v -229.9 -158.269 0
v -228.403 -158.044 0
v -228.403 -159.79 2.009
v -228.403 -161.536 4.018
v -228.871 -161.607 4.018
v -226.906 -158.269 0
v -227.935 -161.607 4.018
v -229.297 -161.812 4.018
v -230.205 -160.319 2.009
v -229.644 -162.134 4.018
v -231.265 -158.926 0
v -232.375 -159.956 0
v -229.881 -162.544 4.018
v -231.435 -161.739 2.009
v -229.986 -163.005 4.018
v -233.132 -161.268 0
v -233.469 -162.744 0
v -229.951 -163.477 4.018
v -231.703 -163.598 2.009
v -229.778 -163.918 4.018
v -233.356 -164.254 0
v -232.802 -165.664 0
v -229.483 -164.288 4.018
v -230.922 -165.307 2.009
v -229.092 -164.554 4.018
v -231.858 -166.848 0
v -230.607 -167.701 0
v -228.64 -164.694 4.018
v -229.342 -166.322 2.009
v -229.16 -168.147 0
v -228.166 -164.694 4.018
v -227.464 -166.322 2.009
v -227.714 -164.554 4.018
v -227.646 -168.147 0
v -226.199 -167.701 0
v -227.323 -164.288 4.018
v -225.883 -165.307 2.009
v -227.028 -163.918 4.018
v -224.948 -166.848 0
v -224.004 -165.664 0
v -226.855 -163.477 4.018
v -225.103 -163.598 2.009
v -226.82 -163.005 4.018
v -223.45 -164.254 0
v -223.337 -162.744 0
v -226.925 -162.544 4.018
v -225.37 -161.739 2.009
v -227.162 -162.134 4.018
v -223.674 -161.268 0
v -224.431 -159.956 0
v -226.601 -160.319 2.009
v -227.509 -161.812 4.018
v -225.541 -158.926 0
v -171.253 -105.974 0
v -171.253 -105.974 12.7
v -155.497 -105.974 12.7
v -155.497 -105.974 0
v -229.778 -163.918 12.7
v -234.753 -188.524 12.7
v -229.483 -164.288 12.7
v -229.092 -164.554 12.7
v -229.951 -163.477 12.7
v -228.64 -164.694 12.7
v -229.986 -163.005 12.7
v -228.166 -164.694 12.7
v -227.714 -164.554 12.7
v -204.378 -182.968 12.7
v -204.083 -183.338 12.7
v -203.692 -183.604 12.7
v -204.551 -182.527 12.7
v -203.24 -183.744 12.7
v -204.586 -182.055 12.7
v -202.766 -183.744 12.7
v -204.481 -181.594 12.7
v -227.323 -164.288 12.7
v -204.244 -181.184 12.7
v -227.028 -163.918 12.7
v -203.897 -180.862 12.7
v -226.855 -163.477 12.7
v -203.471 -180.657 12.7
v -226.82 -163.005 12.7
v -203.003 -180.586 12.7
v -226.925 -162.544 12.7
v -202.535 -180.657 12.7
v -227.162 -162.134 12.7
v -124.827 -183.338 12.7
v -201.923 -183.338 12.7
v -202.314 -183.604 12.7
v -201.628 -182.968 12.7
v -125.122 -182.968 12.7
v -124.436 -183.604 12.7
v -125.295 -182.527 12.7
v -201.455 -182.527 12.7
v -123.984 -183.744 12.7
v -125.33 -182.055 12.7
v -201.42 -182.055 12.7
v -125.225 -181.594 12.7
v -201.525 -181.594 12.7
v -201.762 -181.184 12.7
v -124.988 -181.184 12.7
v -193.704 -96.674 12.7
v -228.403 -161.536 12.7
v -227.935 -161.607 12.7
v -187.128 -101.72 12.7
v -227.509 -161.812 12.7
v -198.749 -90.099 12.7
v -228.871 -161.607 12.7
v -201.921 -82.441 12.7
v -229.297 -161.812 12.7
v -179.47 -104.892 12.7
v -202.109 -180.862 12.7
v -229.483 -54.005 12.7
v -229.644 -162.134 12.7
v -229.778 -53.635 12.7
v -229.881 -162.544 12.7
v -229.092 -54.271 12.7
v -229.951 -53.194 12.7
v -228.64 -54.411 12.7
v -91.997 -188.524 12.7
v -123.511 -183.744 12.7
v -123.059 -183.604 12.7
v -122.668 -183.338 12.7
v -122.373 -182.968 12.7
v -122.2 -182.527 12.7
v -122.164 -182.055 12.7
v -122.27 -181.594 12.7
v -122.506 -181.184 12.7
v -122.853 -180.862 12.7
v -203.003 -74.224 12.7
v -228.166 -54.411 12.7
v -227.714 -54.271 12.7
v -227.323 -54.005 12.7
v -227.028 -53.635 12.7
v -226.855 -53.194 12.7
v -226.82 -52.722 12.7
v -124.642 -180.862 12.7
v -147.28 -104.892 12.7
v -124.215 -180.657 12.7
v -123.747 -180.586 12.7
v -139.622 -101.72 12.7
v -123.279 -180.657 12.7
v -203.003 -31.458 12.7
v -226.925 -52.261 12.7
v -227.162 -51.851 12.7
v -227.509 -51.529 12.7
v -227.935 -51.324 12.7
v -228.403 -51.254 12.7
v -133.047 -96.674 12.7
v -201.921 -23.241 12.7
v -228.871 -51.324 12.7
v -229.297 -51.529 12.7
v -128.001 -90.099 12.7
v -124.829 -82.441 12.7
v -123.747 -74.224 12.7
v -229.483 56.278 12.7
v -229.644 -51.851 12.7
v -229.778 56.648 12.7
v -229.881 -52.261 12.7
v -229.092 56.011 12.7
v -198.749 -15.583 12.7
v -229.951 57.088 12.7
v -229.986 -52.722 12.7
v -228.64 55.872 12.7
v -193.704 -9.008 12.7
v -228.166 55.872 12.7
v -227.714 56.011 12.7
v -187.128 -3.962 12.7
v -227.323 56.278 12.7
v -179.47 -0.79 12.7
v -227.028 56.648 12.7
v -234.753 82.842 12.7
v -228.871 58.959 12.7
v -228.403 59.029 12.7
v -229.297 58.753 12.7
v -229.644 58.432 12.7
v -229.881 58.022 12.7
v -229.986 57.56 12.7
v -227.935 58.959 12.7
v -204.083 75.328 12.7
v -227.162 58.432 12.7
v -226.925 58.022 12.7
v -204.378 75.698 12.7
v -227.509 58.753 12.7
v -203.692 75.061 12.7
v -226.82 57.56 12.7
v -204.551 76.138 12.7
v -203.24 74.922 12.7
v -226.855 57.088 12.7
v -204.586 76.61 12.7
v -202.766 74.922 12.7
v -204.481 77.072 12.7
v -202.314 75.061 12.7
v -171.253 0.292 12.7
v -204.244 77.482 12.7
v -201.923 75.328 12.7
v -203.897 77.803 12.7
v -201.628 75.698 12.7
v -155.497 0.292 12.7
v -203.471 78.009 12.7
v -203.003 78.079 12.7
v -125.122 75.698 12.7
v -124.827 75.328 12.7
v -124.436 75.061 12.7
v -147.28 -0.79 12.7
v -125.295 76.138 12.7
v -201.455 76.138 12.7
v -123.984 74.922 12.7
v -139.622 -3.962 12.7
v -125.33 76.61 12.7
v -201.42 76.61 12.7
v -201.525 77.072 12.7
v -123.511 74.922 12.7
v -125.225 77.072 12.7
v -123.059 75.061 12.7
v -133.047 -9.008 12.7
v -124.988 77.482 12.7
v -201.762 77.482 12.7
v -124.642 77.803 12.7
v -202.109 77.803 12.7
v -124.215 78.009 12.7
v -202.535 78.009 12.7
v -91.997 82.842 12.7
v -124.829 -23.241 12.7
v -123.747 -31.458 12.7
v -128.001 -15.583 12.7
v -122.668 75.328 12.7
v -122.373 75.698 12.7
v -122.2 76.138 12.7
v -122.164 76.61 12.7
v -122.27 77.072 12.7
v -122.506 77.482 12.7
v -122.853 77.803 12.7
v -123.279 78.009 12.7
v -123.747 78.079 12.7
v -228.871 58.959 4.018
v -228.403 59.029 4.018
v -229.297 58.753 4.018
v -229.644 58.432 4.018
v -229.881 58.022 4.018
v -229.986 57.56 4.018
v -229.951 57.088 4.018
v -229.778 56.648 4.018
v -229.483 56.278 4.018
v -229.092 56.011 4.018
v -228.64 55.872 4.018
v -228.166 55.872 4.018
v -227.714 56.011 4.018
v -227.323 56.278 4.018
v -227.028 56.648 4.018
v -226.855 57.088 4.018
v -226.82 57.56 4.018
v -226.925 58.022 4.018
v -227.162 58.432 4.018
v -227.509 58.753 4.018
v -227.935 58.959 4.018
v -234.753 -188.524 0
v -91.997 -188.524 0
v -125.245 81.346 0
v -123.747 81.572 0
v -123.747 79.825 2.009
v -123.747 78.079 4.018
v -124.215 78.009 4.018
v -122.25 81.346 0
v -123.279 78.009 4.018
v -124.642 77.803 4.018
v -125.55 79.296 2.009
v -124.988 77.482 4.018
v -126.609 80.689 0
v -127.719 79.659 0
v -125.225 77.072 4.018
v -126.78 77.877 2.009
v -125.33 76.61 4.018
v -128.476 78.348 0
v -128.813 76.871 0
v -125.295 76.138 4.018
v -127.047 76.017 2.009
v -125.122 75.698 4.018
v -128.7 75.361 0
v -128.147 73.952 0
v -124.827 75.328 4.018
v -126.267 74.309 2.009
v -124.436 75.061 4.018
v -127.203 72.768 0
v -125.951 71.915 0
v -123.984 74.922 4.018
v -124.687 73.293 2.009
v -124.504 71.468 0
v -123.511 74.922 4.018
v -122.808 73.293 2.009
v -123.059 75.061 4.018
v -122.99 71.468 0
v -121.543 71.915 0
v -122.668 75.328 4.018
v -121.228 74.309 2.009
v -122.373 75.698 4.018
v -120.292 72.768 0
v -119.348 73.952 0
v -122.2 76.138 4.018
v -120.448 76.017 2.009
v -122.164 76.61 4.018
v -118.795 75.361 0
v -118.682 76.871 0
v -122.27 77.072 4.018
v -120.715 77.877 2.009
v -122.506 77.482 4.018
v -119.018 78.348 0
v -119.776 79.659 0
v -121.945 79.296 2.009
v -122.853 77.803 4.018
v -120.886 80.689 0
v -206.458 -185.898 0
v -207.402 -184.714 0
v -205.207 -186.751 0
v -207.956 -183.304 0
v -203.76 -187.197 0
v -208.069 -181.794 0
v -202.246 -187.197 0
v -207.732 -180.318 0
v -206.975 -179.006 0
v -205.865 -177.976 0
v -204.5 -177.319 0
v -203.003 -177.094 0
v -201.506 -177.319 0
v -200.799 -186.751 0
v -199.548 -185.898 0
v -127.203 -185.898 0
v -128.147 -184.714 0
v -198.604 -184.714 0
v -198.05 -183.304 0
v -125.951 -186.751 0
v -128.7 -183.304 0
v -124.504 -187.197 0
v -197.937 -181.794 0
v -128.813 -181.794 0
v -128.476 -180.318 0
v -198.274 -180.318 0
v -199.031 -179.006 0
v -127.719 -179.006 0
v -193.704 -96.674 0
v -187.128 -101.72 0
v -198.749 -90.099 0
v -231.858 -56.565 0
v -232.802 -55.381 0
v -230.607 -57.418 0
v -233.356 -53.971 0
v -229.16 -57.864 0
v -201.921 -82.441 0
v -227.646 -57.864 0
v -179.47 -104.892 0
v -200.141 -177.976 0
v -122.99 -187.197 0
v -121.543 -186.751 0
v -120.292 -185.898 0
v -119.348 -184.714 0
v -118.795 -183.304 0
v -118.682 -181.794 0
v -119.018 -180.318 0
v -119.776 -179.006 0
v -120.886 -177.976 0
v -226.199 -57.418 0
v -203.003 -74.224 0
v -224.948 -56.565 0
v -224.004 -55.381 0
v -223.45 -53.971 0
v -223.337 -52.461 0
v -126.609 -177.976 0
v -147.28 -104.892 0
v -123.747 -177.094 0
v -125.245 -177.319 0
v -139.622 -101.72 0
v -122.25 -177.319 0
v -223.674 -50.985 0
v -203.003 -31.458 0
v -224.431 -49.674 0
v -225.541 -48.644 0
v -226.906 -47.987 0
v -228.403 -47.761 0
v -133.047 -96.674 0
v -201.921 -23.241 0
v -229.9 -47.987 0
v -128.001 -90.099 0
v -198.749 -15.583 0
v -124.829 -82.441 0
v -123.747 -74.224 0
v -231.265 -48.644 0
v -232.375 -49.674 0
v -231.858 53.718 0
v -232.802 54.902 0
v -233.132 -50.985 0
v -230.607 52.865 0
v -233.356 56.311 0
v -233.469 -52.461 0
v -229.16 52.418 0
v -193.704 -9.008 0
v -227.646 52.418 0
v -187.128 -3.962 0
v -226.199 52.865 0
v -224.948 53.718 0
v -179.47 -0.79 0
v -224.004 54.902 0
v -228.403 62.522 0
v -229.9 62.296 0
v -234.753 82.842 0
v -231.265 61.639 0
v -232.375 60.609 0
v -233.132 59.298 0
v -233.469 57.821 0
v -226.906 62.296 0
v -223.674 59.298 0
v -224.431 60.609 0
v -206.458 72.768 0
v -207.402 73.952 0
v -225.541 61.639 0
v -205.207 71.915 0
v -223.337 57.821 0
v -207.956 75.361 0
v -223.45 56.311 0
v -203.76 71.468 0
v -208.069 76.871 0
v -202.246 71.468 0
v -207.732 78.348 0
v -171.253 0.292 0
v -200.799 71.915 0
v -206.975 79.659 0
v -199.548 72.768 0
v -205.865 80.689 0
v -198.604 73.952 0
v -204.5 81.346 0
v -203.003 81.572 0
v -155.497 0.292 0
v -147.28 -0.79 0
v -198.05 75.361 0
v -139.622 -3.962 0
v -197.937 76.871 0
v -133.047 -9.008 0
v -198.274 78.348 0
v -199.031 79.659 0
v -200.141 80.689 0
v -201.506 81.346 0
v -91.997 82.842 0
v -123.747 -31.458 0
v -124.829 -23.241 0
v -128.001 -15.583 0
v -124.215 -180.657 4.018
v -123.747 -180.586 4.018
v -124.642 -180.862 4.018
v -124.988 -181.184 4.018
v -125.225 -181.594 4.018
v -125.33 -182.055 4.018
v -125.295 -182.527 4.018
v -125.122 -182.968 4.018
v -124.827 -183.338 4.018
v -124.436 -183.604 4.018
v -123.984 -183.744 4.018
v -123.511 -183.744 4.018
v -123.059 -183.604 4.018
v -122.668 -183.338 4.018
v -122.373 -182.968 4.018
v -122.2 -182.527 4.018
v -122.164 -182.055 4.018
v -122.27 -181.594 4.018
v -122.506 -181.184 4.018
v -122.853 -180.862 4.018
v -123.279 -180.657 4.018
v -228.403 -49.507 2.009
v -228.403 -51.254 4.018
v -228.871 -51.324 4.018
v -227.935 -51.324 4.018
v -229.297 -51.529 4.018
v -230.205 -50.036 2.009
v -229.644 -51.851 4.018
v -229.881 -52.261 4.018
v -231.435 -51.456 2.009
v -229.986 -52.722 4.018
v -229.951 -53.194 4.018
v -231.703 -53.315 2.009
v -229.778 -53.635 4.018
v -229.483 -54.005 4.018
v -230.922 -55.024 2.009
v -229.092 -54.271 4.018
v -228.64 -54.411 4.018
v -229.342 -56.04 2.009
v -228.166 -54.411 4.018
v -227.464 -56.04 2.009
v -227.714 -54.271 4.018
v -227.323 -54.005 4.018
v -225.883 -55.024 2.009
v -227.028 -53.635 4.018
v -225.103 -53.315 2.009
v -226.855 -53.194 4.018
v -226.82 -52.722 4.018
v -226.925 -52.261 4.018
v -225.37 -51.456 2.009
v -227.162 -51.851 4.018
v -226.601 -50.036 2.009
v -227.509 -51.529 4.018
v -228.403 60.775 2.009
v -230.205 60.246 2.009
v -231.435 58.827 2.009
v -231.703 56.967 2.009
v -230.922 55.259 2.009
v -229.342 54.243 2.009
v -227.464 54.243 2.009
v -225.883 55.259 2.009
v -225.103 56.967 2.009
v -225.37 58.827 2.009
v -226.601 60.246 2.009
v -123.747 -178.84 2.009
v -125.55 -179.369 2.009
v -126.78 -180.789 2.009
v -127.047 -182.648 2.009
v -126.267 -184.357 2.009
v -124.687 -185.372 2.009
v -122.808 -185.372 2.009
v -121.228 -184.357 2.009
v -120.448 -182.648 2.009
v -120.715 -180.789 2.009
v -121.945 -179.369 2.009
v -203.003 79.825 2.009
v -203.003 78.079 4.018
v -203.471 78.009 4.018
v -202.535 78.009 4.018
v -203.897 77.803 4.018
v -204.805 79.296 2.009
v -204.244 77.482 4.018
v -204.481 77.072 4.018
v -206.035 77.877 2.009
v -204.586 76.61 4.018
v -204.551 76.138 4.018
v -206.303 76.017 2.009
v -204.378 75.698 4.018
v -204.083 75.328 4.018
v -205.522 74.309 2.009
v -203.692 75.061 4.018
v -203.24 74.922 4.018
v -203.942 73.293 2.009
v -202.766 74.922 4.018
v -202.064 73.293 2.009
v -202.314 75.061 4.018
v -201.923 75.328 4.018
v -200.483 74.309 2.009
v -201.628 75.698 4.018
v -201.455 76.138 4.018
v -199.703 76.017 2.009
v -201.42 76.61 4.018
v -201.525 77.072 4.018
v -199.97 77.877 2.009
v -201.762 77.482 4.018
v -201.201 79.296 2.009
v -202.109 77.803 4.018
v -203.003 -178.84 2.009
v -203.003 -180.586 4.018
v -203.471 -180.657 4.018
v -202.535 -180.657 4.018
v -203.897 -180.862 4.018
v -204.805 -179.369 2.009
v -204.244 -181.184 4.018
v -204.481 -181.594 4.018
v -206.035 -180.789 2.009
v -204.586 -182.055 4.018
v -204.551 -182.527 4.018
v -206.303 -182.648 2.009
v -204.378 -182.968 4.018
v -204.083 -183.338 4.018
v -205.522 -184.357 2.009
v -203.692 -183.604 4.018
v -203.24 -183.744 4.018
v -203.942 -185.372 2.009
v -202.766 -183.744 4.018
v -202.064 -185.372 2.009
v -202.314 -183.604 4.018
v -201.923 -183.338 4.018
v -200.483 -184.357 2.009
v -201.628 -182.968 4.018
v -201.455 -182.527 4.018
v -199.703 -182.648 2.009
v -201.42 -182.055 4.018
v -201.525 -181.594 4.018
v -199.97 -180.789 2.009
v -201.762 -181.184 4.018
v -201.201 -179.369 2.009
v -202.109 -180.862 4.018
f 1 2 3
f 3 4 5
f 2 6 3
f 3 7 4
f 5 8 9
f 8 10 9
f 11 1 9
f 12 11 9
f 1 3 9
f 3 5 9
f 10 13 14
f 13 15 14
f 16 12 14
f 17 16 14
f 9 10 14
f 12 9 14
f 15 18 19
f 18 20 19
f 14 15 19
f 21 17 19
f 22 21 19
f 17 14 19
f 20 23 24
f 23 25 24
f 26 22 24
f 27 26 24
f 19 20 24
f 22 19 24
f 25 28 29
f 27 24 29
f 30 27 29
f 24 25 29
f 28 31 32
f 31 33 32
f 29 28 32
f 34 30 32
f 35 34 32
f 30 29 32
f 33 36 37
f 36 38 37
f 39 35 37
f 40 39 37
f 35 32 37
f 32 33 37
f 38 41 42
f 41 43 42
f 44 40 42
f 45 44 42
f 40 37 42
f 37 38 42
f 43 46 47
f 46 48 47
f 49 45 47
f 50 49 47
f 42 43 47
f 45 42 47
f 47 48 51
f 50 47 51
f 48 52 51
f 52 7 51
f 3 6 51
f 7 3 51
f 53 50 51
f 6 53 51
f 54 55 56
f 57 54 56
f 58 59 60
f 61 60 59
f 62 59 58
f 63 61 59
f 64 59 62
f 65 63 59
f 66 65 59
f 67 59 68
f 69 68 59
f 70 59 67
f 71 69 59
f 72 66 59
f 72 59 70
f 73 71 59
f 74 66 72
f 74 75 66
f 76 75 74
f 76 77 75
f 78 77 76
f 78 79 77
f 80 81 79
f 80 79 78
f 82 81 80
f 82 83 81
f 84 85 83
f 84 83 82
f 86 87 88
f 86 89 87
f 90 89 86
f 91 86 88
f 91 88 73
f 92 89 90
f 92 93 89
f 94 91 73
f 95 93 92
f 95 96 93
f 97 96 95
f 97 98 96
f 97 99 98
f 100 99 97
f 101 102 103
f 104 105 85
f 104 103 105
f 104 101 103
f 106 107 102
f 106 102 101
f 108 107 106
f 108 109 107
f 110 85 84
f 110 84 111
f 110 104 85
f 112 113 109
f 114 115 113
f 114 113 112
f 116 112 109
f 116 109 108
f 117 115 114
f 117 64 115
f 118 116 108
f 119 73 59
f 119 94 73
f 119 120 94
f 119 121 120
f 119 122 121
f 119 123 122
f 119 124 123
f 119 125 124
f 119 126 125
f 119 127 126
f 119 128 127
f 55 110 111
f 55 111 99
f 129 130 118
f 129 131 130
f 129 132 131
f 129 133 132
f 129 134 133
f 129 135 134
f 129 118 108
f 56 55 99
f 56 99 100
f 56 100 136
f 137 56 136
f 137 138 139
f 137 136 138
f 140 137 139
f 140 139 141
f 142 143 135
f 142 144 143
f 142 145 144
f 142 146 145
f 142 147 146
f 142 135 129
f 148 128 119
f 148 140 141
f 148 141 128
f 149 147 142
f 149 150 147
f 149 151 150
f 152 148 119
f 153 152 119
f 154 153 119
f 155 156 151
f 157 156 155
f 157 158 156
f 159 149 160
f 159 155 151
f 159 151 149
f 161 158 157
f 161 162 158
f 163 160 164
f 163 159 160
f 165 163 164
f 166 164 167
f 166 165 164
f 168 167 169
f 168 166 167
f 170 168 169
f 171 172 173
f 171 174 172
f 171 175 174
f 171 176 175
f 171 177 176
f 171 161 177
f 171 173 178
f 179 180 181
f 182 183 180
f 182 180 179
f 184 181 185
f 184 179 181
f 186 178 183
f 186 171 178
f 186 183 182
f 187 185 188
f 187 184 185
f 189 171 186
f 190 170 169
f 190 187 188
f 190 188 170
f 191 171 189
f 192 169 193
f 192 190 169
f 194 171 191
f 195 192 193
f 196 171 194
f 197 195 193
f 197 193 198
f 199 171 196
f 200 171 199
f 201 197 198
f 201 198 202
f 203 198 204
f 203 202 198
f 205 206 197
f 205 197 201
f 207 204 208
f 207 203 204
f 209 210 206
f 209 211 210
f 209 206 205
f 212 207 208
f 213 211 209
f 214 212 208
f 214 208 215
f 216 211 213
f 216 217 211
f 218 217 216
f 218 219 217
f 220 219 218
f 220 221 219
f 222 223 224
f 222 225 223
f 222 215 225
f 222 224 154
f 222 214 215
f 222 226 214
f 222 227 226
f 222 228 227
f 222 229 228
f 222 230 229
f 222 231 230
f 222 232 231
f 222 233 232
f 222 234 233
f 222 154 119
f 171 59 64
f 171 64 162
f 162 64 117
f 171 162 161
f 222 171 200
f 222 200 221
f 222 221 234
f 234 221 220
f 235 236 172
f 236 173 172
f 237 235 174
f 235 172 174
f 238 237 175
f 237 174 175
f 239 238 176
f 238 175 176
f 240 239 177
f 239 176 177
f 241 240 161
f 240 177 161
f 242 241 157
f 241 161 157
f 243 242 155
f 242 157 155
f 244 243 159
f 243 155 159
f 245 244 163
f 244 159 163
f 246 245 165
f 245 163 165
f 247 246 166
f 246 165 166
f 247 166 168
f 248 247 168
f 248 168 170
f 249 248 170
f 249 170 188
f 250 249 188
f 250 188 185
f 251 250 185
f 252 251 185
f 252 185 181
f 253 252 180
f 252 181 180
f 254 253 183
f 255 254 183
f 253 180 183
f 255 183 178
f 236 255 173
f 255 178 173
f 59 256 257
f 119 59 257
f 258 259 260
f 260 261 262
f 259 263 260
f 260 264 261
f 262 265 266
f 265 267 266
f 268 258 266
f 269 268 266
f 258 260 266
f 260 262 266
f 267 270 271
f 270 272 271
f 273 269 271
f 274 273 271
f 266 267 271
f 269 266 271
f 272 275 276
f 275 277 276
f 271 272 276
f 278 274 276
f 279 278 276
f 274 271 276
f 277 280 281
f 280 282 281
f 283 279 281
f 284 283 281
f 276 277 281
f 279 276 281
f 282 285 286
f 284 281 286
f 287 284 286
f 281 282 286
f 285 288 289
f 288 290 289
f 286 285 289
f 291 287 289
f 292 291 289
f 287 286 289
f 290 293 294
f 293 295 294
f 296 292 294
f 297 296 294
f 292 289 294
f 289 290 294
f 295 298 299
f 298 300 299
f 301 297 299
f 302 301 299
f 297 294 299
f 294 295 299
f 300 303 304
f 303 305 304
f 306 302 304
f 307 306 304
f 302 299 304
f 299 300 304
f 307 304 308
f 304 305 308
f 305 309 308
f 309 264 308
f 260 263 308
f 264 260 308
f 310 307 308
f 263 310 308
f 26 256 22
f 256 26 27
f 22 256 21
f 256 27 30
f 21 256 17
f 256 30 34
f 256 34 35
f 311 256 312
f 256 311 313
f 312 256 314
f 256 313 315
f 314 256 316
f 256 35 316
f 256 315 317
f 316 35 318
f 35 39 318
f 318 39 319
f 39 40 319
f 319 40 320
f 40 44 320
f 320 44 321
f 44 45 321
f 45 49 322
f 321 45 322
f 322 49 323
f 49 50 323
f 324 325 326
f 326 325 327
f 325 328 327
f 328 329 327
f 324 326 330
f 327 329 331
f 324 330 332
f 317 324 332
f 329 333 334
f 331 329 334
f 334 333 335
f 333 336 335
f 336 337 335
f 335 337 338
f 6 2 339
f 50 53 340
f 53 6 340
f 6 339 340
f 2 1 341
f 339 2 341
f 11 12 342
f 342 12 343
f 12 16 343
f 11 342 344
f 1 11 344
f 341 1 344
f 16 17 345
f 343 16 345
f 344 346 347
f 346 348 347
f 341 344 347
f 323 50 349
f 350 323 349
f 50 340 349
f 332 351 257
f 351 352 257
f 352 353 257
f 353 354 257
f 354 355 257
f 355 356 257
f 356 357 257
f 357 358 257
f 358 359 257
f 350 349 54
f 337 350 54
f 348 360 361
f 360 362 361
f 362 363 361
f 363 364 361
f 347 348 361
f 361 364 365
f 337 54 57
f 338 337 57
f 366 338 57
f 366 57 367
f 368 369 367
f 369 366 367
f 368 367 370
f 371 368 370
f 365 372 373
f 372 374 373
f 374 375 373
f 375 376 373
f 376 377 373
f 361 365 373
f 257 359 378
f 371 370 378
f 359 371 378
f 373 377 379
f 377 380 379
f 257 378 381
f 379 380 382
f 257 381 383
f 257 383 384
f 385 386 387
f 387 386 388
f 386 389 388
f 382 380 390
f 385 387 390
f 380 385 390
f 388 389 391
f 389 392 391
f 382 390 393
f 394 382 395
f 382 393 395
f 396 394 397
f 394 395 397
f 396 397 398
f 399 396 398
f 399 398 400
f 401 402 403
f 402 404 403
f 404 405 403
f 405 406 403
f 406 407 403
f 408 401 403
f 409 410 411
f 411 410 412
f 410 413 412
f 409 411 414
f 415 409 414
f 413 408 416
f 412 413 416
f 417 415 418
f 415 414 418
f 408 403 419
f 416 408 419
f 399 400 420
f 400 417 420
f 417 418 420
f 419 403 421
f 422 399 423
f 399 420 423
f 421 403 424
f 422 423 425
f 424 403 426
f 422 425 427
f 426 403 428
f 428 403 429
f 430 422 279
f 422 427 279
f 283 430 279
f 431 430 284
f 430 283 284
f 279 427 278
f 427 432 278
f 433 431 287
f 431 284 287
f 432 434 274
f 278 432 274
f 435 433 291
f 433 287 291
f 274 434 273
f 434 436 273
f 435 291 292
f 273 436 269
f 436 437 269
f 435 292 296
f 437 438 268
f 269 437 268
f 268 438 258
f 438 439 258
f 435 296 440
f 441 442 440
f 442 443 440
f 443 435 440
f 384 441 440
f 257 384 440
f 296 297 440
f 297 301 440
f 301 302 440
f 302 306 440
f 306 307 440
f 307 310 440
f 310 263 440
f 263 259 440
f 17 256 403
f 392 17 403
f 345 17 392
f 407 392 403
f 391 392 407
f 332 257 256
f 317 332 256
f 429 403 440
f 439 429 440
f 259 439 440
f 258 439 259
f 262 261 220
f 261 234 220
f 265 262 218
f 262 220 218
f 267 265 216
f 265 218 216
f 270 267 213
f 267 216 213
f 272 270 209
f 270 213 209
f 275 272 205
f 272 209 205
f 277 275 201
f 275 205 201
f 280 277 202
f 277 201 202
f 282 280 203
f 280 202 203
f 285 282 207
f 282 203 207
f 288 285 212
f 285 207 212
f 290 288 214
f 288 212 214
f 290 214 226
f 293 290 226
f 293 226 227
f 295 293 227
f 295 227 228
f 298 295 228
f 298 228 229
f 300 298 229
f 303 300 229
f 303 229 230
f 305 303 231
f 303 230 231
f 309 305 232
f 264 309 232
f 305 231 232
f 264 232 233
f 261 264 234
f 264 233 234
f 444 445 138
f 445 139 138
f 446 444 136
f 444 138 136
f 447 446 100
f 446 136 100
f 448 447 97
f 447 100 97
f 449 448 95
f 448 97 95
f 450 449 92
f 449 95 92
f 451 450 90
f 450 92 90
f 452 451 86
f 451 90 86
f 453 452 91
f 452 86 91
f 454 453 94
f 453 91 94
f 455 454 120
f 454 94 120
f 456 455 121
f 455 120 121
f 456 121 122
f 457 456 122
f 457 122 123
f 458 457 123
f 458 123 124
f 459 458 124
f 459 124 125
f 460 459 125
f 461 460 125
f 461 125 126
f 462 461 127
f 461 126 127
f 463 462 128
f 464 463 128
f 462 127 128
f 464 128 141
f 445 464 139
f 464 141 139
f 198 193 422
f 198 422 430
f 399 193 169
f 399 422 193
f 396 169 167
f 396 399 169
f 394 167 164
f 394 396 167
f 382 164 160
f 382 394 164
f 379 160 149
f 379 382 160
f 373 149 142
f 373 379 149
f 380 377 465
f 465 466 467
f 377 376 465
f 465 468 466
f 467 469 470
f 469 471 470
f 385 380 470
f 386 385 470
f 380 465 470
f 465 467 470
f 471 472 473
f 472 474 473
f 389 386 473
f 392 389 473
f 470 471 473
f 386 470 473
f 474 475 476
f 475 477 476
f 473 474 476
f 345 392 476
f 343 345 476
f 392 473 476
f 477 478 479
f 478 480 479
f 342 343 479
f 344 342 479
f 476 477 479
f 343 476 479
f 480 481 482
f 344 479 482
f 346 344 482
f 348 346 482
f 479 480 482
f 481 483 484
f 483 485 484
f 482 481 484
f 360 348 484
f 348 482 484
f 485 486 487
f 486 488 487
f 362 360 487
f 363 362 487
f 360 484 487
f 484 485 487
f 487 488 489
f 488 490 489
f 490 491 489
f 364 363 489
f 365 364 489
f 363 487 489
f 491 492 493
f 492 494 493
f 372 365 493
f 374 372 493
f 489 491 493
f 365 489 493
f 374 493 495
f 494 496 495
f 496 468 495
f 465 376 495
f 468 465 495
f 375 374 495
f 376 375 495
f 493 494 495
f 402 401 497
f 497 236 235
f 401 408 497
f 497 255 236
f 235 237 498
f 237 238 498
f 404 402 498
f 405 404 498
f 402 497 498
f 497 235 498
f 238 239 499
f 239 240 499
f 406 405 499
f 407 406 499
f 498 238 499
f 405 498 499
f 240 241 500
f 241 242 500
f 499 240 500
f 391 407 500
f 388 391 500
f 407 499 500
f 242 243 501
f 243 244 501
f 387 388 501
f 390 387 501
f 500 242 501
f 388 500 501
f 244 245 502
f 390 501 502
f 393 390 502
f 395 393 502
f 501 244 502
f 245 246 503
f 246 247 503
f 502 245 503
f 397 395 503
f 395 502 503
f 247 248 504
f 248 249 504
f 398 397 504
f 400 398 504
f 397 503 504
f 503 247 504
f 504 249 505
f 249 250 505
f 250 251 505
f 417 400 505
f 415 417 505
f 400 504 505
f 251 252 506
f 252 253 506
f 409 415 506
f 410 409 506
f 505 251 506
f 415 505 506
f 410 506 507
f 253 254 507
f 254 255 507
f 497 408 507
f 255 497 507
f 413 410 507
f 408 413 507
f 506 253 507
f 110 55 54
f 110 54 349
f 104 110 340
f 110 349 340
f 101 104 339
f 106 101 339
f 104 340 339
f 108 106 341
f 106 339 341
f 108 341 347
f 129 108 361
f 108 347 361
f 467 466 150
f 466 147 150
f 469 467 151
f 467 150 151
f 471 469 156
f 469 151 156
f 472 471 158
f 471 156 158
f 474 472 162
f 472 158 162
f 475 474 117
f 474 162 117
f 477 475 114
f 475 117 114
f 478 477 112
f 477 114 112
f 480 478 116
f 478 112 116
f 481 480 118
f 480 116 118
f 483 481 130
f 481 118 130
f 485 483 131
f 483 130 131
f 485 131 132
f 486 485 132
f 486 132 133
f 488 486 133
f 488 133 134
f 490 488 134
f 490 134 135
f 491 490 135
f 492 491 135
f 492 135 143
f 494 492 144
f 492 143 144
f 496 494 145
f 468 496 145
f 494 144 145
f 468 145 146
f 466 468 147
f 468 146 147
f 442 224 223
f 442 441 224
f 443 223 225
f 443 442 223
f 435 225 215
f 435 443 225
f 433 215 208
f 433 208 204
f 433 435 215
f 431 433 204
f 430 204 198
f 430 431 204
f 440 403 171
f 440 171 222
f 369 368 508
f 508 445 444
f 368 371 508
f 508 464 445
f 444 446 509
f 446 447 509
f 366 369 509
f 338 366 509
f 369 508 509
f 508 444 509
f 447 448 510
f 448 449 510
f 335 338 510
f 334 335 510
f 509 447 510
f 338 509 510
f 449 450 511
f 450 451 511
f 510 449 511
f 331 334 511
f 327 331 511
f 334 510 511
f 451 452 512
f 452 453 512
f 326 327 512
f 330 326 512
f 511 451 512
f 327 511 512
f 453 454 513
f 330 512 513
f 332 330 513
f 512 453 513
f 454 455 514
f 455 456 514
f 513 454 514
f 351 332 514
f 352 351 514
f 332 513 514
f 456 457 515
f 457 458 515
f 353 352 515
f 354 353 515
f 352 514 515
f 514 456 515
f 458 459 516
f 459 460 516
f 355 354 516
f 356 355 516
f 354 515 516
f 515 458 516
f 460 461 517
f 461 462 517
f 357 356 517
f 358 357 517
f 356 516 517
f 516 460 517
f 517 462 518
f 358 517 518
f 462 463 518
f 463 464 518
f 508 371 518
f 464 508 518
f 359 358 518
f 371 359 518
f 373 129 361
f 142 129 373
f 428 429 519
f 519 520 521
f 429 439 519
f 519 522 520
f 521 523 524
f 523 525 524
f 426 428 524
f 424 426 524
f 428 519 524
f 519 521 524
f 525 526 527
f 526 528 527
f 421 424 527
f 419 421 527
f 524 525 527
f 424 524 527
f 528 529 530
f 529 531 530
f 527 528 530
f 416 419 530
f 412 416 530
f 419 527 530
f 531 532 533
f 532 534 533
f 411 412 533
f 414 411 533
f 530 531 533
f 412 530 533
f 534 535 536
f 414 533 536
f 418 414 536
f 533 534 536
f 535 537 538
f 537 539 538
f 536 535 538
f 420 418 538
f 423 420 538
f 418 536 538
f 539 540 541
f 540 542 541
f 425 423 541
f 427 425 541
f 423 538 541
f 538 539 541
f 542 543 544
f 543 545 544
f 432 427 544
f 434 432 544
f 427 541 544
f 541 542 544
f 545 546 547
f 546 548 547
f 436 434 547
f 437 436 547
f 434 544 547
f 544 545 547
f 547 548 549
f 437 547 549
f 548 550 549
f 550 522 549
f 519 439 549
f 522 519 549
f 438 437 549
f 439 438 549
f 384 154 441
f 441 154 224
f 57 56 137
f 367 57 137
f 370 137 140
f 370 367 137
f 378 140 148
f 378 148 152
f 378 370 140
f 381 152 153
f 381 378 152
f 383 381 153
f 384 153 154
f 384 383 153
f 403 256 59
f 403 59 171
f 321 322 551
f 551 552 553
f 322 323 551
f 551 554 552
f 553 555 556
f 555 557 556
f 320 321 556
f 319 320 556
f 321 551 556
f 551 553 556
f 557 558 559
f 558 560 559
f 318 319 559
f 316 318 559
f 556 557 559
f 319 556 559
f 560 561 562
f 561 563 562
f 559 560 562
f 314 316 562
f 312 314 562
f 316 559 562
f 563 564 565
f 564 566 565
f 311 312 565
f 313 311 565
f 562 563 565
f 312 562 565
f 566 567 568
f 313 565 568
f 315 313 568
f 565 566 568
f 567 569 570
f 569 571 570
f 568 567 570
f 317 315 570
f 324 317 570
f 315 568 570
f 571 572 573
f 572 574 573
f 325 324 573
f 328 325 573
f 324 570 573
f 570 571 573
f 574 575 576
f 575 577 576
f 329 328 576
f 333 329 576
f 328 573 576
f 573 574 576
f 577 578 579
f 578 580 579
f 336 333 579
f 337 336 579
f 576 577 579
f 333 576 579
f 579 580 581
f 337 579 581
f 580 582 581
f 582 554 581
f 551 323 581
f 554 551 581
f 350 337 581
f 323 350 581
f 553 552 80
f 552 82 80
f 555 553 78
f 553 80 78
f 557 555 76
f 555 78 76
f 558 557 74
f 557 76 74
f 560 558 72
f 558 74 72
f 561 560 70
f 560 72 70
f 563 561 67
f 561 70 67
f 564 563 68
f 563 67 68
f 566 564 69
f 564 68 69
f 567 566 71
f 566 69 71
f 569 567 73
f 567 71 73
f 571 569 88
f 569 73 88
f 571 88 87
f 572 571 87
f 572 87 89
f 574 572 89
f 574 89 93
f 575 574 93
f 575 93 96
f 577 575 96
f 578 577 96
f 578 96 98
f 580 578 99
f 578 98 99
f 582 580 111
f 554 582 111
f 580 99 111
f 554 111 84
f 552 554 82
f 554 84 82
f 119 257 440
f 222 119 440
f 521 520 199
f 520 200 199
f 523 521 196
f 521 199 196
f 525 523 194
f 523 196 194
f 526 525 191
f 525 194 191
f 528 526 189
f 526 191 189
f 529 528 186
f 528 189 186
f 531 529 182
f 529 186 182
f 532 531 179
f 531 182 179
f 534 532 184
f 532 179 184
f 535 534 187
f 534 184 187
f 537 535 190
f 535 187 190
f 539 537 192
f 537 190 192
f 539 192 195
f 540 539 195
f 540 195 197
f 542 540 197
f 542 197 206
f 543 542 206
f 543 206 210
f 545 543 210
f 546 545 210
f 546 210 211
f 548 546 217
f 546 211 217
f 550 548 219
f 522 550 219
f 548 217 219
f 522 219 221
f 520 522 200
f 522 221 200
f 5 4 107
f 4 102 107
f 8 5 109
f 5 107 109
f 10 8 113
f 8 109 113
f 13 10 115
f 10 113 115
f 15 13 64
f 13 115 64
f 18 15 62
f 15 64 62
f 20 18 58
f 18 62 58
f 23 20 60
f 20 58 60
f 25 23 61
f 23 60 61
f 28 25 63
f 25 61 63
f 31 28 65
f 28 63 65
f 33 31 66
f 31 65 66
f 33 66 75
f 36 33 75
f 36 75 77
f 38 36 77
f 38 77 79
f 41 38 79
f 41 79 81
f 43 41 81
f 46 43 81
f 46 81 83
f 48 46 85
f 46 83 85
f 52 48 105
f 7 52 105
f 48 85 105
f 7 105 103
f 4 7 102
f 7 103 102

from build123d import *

# Parameters (mm, degrees)
SKETCH1_W           = 142.755639788
SKETCH1_H           = 271.365530146
BOSS_EXTRUDE1_DEPTH = 12.7
HOLE1_D             = 3.175
HOLE1_DEPTH         = 31.75
HOLE1_CSINK_D       = 10.16
HOLE1_CSINK_ANGLE   = 82
HOLE1_TIP           = 0.953866233
SKETCH4_W           = 79.255639788
SKETCH4_H           = 106.265530146
CUT_EXTRUDE1_DEPTH  = 302.349406056
FILLET1_R           = 31.75


with BuildPart() as part:
    # Sketch1 → Boss-Extrude1 (new body)
    with BuildSketch(Plane.XY):
        with Locations((-163.375147287, -52.841023691)):
            Rectangle(SKETCH1_W, SKETCH1_H)
    extrude(amount=BOSS_EXTRUDE1_DEPTH)

    # Hole1
    with Locations(Plane(origin=(181.039434513, -52.974999997, 0), x_dir=(0, -1, 0), z_dir=(0, 0, -1))):
        with Locations((129.198788767, 384.042401694), (-129.466741379, 384.042401694), (-129.466741379, 304.786761906), (-110.416741379, 409.442401694), (-0.133976306, 409.442401694), (110.148788767, 409.442401694), (129.198788767, 304.786761906)):
            CounterSinkHole(HOLE1_D / 2, HOLE1_CSINK_D / 2, depth=HOLE1_DEPTH, counter_sink_angle=HOLE1_CSINK_ANGLE)
            with Locations((0, 0, -(HOLE1_DEPTH + HOLE1_TIP / 2))):  # 118° drill point
                Cone(0, HOLE1_D / 2, HOLE1_TIP, mode=Mode.SUBTRACT)

    # Sketch4 → Cut-Extrude1 (cut, through all)
    with BuildSketch(Plane.XY.offset(12.7)):
        with Locations((-163.375147287, -52.841023691)):
            Rectangle(SKETCH4_W, SKETCH4_H)
    extrude(amount=-CUT_EXTRUDE1_DEPTH, mode=Mode.SUBTRACT)

    # Fillet1
    fillet1_edges = [part.edges().sort_by_distance(p)[0] for p in [
        (-203.002967181, -105.973788764, 6.35),
        (-203.002967181, 0.291741382, 6.35),
        (-123.747327393, 0.291741382, 6.35),
        (-123.747327393, -105.973788764, 6.35),
    ]]
    fillet(fillet1_edges, radius=FILLET1_R)


solid = part.part
